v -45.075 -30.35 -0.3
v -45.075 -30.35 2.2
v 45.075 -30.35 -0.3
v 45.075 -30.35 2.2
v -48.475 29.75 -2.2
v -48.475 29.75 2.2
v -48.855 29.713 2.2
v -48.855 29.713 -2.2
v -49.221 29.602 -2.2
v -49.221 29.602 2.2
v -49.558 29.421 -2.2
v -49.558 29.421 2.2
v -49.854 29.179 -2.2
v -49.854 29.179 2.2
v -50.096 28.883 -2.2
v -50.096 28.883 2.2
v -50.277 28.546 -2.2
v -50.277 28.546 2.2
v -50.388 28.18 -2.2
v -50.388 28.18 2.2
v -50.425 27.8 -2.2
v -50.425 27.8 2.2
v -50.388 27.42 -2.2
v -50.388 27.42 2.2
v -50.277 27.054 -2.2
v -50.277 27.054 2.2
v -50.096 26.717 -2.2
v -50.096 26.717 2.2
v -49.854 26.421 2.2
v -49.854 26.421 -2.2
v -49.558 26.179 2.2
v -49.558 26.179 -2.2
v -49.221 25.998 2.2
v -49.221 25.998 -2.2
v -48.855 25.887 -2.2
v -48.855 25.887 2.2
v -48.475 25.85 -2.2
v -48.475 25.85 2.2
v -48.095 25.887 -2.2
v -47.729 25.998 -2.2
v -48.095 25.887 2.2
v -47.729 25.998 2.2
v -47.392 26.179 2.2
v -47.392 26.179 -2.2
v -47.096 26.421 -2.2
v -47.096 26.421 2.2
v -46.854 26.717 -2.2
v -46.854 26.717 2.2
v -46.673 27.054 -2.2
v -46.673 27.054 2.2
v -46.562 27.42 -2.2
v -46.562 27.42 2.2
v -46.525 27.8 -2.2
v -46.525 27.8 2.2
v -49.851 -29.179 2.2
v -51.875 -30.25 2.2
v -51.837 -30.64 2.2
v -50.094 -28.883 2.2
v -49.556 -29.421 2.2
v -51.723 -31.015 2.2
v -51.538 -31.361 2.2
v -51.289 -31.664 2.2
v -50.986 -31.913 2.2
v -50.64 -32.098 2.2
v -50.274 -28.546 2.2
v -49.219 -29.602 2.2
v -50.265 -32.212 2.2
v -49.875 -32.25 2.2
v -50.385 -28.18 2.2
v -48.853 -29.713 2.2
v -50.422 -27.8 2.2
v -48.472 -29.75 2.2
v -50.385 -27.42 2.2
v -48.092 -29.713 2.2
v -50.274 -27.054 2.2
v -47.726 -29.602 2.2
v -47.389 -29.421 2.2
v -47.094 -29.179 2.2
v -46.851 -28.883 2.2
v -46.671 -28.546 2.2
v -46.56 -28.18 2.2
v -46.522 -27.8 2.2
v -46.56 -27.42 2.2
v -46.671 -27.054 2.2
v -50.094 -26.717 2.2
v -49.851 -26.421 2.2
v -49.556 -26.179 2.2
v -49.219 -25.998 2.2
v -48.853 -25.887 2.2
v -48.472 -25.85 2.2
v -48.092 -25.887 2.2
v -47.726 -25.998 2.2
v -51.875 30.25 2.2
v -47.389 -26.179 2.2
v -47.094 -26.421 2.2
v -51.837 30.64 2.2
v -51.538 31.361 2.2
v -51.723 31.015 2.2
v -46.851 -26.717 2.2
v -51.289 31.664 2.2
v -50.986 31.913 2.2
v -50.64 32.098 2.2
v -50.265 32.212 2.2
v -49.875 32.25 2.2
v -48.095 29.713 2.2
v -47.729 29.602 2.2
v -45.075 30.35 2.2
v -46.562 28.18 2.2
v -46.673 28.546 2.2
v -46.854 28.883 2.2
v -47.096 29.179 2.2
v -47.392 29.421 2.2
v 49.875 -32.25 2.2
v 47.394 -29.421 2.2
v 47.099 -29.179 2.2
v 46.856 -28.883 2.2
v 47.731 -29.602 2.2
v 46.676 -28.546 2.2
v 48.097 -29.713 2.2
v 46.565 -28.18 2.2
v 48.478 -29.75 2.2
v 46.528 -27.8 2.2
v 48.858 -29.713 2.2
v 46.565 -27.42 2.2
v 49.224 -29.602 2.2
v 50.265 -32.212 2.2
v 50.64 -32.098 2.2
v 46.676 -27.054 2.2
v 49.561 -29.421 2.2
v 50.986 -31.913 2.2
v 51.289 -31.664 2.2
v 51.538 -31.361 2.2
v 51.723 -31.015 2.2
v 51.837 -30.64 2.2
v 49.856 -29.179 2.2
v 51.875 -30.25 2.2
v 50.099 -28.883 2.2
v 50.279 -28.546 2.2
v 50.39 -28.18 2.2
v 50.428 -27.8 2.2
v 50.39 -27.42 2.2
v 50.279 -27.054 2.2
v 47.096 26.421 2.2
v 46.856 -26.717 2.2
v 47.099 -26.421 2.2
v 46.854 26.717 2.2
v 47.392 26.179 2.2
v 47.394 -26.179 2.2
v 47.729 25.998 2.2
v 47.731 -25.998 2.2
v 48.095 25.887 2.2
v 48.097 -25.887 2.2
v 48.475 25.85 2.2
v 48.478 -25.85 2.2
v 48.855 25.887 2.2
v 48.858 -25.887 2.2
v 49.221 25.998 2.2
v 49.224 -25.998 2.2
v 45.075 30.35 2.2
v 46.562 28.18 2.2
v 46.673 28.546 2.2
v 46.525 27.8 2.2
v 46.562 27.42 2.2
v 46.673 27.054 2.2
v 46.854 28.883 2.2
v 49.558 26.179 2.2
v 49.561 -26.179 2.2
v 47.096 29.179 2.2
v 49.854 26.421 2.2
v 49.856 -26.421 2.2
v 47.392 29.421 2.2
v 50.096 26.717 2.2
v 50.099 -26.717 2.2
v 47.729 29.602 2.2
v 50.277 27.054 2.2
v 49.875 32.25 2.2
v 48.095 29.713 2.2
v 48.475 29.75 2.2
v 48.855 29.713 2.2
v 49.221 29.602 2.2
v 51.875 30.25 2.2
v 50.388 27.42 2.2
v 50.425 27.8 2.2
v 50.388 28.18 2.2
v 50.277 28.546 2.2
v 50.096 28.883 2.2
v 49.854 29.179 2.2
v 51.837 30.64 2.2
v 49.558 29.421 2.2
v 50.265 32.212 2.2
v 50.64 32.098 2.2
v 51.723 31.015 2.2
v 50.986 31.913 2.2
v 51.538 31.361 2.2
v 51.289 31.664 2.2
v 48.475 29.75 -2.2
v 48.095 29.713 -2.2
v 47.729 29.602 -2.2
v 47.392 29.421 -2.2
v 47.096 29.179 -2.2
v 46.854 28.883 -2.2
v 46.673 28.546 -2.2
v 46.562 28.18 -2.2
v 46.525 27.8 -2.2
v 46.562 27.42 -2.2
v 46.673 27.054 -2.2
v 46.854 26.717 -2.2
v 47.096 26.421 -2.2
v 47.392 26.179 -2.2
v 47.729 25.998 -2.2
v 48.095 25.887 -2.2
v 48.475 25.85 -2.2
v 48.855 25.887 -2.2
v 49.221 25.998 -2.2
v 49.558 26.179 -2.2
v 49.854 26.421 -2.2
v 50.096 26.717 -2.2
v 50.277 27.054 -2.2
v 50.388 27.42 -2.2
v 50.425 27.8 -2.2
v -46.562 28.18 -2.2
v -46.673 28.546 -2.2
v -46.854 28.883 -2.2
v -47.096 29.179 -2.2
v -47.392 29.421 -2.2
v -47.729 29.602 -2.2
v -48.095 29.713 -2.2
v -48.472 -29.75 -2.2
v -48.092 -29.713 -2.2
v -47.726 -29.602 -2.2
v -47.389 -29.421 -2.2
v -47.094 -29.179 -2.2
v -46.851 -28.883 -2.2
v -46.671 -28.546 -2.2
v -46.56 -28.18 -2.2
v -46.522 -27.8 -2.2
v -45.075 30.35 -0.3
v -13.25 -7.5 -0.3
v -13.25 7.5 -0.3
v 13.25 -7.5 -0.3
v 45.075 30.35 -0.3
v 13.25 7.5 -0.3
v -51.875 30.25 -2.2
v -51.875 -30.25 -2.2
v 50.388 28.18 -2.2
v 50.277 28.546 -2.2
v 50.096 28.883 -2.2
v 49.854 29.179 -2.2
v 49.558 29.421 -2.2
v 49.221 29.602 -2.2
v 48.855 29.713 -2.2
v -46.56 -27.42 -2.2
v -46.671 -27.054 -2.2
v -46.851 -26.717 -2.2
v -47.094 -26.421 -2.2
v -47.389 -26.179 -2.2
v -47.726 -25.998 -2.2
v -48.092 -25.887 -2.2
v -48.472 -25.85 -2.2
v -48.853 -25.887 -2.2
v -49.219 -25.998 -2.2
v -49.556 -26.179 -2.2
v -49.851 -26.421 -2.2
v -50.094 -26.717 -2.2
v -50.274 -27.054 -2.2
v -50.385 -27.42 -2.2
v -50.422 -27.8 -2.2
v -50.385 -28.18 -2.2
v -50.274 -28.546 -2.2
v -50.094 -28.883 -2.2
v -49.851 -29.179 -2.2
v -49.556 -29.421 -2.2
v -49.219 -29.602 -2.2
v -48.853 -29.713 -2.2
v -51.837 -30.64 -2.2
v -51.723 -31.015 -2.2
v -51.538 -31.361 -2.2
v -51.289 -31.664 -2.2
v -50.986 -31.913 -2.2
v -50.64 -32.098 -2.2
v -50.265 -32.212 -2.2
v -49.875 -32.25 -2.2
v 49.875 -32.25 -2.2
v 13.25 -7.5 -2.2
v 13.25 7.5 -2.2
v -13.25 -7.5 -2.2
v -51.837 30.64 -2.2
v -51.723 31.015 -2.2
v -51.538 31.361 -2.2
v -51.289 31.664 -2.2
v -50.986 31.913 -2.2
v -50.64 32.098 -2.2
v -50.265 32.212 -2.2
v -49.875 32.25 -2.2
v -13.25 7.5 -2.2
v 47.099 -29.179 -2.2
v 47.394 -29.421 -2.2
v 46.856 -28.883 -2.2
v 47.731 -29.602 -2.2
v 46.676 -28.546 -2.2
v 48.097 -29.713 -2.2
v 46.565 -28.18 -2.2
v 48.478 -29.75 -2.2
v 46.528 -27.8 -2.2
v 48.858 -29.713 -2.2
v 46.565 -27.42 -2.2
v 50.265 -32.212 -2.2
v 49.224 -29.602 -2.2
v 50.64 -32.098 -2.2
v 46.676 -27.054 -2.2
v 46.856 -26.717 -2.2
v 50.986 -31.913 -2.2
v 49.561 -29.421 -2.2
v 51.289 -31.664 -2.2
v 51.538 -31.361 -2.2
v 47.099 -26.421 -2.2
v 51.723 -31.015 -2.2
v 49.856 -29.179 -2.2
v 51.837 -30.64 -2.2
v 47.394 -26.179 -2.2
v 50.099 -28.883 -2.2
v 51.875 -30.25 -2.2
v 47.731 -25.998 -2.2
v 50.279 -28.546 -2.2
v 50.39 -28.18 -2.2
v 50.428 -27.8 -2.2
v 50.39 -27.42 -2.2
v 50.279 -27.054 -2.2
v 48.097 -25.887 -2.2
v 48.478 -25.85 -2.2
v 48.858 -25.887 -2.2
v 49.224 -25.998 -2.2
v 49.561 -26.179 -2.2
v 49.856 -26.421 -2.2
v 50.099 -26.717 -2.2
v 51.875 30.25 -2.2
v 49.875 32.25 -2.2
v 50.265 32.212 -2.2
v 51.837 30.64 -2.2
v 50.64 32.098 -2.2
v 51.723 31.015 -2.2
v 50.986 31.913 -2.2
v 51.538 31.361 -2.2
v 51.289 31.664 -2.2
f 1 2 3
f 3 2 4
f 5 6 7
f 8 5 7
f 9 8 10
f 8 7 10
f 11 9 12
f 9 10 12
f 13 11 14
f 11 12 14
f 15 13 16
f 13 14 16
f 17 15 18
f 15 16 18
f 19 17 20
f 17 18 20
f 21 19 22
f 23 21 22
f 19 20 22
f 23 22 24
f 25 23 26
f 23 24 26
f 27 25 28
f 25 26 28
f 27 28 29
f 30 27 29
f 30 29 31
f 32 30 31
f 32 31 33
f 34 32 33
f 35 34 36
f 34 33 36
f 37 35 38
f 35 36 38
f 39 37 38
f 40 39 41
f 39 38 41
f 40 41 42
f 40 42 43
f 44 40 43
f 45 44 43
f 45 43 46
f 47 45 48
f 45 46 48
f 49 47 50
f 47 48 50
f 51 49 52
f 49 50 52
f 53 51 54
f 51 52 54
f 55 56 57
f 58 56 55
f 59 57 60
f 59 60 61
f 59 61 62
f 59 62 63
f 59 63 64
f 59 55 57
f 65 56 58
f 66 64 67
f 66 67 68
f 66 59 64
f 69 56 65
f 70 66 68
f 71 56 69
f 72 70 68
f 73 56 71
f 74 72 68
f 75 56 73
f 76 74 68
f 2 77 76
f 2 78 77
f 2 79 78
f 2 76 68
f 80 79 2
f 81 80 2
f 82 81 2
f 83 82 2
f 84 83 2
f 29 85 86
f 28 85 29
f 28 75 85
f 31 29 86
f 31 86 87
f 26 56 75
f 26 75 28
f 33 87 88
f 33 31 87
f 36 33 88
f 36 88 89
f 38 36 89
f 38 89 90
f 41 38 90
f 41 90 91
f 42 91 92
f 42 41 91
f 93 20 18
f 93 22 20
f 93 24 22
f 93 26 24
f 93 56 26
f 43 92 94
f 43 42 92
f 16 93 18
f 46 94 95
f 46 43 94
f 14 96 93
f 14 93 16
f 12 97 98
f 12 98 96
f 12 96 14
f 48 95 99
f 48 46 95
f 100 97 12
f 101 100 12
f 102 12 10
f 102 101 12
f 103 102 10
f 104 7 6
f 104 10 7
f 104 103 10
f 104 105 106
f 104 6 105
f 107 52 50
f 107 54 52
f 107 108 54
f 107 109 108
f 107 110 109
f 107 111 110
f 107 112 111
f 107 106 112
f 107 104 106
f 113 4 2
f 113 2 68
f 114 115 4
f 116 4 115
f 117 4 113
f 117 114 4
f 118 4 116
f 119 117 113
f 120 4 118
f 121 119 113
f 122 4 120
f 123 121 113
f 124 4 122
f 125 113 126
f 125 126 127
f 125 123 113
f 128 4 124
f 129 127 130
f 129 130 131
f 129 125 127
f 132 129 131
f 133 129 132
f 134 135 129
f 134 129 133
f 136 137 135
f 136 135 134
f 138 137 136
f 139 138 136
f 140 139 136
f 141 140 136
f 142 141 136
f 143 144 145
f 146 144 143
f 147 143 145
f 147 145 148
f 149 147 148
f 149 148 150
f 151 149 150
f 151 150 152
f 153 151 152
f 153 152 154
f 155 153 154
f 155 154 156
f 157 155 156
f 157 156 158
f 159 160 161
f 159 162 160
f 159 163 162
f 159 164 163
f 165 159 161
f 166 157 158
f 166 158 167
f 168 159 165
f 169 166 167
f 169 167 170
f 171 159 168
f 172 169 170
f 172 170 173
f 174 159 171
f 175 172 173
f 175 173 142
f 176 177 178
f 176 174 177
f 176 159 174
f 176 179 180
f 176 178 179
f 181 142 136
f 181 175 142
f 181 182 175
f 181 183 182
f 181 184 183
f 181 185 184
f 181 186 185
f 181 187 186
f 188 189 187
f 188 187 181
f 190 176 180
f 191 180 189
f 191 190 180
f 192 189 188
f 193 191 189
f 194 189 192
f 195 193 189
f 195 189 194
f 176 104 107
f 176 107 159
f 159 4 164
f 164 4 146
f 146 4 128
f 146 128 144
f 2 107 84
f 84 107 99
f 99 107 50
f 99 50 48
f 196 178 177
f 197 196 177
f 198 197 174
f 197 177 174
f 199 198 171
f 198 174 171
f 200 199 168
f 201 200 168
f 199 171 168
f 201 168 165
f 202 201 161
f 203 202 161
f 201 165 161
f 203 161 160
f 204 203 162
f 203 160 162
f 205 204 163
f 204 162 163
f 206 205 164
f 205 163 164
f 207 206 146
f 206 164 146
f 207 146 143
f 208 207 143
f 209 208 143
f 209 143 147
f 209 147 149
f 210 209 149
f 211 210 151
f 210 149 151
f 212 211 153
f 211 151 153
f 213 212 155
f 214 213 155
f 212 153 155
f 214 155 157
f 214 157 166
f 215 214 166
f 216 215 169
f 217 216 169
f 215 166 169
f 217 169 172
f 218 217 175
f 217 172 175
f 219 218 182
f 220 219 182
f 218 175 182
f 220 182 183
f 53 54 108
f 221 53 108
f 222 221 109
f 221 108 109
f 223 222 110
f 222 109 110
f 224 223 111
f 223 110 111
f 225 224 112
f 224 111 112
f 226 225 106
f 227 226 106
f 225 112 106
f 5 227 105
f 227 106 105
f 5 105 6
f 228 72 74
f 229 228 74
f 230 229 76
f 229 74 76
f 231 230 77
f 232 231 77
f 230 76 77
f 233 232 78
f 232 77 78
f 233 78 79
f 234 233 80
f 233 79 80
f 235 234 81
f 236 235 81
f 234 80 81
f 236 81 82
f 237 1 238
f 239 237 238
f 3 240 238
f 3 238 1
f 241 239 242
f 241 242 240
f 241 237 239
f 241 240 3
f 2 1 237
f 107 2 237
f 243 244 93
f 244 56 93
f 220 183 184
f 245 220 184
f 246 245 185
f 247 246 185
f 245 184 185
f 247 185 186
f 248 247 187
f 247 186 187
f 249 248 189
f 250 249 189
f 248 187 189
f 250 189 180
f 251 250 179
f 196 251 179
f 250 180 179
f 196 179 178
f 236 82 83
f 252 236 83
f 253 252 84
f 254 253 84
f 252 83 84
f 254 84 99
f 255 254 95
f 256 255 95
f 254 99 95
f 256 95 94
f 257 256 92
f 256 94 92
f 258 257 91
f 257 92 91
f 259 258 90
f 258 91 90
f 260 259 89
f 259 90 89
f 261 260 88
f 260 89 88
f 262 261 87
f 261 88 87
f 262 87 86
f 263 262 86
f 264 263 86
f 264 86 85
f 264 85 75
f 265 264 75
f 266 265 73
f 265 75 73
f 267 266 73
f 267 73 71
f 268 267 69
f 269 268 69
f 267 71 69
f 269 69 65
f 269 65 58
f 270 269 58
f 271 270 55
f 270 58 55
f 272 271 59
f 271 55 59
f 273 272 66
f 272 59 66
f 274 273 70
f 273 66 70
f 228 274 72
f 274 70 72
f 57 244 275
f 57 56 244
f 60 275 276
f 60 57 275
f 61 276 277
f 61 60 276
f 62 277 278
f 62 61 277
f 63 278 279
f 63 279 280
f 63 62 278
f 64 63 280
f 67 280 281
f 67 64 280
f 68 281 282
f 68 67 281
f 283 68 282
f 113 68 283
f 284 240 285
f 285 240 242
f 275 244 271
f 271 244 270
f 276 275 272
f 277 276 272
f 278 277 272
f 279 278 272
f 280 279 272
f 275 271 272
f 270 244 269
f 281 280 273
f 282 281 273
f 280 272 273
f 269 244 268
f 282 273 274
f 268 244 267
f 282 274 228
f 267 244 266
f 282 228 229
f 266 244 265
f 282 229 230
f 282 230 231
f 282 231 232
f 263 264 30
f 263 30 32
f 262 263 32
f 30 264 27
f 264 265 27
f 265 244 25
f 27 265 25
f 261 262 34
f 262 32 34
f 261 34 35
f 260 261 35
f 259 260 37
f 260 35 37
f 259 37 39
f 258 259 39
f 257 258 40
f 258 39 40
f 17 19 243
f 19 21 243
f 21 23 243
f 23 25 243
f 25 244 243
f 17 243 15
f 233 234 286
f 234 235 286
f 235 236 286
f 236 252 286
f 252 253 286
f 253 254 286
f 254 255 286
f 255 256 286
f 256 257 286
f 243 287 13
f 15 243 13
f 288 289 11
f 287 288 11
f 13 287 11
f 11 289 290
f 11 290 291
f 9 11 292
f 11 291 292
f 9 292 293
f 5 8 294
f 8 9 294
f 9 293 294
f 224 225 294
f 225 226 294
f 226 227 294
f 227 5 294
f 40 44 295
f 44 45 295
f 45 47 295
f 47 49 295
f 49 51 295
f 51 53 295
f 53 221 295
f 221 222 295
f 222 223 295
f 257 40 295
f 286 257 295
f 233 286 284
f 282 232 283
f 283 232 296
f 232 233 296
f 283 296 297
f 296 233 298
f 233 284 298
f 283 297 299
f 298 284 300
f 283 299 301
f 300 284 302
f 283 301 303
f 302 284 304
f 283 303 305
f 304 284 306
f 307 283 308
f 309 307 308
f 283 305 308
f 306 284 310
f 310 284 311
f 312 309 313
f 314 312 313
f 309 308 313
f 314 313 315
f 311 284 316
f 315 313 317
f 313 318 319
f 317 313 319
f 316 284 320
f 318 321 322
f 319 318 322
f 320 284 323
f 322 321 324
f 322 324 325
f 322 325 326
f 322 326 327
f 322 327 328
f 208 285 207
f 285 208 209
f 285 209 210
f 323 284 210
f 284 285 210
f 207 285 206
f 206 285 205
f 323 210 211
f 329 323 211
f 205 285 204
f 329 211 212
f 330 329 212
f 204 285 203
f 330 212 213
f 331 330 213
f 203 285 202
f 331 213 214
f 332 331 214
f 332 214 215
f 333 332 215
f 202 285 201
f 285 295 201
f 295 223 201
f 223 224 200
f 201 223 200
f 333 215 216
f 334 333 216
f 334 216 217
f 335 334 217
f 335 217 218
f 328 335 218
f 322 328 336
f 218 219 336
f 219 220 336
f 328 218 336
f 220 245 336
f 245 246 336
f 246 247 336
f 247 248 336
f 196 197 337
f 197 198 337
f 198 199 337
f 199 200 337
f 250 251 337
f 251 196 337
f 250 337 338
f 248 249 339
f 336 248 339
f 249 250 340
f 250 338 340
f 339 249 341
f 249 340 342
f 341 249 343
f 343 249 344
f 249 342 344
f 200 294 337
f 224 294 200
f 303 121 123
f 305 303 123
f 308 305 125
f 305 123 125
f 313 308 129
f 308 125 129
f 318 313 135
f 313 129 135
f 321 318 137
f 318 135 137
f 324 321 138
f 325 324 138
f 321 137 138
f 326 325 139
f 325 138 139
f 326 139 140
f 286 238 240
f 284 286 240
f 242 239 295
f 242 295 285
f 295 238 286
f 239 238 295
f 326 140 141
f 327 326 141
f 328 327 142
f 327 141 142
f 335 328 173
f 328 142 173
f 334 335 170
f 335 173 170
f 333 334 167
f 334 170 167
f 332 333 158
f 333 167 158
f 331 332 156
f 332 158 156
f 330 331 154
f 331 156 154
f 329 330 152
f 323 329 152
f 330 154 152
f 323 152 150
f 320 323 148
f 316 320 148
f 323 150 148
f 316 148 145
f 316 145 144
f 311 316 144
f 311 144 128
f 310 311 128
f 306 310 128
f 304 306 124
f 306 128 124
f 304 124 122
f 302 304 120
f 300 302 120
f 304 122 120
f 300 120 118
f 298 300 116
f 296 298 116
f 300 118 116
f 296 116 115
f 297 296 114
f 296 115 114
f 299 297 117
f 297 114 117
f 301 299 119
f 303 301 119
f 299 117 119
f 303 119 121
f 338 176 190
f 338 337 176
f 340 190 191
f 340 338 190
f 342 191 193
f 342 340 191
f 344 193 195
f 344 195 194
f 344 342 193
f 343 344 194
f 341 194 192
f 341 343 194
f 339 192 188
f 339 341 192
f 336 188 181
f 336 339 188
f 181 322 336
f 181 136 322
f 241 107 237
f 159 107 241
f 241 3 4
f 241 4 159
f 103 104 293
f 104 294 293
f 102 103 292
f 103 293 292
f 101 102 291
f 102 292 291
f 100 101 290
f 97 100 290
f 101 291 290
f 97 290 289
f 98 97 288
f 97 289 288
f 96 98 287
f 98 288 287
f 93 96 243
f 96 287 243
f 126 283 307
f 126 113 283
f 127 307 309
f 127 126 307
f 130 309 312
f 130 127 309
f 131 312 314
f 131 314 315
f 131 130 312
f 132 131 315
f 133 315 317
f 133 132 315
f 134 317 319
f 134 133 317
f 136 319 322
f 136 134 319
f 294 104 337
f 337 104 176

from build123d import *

# Parameters (mm, degrees)
F0_W      = 103.75
F0_H      = 64.5
F1_DEPTH  = 2.2
F2_T      = -1.9
F3_W      = 26.5
F3_H      = 15
F4_DEPTH  = 12.7
F5_R      = 2
F6_R      = 2
F7_W      = 4.9
F7_H      = 60.7
F8_DEPTH  = 2.5
F9_W      = 4.9
F9_H      = 60.7
F10_DEPTH = 2.5
F12_DEPTH = 4.4


with BuildPart() as f1:
    # F0 (on Top) → F1 (new body, symmetric)
    with BuildSketch(Plane.XY):
        Rectangle(F0_W, F0_H)
    extrude(amount=F1_DEPTH, both=True)

    # F2
    f2_openings = [f1.faces().sort_by_distance(p)[0] for p in [
        (0, 0, 2.2),
    ]]
    offset(amount=F2_T, openings=f2_openings)

    # F3 (on Top) → F4 (cut, symmetric)
    with BuildSketch(Plane.XY):
        Rectangle(F3_W, F3_H)
    extrude(amount=F4_DEPTH, both=True, mode=Mode.SUBTRACT)

    # F5
    f5_edges = [f1.edges().sort_by_distance(p)[0] for p in [
        (-51.875, 32.25, 0),
    ]]
    fillet(f5_edges, radius=F5_R)

    # F6
    f6_edges = [f1.edges().sort_by_distance(p)[0] for p in [
        (-51.875, -32.25, 0),
        (51.875, -32.25, 0),
        (51.875, 32.25, 0),
    ]]
    fillet(f6_edges, radius=F6_R)

    # F7 (on face) → F8 (join)
    with BuildSketch(Plane.XY.offset(-0.3)):
        with Locations((-47.525, 0)):
            Rectangle(F7_W, F7_H)
    extrude(amount=F8_DEPTH)

    # F9 (on face) → F10 (join)
    with BuildSketch(Plane.XY.offset(-0.3)):
        with Locations((47.525, 0)):
            Rectangle(F9_W, F9_H)
    extrude(amount=F10_DEPTH)

    # F11 (on face) → F12 (cut)
    with BuildSketch(Plane.XY.offset(2.2)):
        with BuildLine():
            ThreePointArc((-48.475, 29.75), (-49.853858, 26.421142), (-46.525, 27.8))
            ThreePointArc((-46.525, 27.8), (-47.096142, 29.178858), (-48.475, 29.75))
        make_face()
        with BuildLine():
            ThreePointArc((48.474999, 29.75), (47.096141, 26.421142), (50.424999, 27.8))
            ThreePointArc((50.424999, 27.8), (49.853858, 29.178858), (48.474999, 29.75))
        make_face()
        with BuildLine():
            ThreePointArc((-48.472498, -29.75), (-47.09364, -29.178858), (-46.522498, -27.8))
            ThreePointArc((-46.522498, -27.8), (-49.851357, -26.421142), (-48.472498, -29.75))
        make_face()
        with BuildLine():
            ThreePointArc((48.477501, -29.75), (49.856359, -29.178858), (50.427501, -27.8))
            ThreePointArc((50.427501, -27.8), (47.098643, -26.421142), (48.477501, -29.75))
        make_face()
    extrude(amount=-F12_DEPTH, mode=Mode.SUBTRACT)


solid = f1.part
